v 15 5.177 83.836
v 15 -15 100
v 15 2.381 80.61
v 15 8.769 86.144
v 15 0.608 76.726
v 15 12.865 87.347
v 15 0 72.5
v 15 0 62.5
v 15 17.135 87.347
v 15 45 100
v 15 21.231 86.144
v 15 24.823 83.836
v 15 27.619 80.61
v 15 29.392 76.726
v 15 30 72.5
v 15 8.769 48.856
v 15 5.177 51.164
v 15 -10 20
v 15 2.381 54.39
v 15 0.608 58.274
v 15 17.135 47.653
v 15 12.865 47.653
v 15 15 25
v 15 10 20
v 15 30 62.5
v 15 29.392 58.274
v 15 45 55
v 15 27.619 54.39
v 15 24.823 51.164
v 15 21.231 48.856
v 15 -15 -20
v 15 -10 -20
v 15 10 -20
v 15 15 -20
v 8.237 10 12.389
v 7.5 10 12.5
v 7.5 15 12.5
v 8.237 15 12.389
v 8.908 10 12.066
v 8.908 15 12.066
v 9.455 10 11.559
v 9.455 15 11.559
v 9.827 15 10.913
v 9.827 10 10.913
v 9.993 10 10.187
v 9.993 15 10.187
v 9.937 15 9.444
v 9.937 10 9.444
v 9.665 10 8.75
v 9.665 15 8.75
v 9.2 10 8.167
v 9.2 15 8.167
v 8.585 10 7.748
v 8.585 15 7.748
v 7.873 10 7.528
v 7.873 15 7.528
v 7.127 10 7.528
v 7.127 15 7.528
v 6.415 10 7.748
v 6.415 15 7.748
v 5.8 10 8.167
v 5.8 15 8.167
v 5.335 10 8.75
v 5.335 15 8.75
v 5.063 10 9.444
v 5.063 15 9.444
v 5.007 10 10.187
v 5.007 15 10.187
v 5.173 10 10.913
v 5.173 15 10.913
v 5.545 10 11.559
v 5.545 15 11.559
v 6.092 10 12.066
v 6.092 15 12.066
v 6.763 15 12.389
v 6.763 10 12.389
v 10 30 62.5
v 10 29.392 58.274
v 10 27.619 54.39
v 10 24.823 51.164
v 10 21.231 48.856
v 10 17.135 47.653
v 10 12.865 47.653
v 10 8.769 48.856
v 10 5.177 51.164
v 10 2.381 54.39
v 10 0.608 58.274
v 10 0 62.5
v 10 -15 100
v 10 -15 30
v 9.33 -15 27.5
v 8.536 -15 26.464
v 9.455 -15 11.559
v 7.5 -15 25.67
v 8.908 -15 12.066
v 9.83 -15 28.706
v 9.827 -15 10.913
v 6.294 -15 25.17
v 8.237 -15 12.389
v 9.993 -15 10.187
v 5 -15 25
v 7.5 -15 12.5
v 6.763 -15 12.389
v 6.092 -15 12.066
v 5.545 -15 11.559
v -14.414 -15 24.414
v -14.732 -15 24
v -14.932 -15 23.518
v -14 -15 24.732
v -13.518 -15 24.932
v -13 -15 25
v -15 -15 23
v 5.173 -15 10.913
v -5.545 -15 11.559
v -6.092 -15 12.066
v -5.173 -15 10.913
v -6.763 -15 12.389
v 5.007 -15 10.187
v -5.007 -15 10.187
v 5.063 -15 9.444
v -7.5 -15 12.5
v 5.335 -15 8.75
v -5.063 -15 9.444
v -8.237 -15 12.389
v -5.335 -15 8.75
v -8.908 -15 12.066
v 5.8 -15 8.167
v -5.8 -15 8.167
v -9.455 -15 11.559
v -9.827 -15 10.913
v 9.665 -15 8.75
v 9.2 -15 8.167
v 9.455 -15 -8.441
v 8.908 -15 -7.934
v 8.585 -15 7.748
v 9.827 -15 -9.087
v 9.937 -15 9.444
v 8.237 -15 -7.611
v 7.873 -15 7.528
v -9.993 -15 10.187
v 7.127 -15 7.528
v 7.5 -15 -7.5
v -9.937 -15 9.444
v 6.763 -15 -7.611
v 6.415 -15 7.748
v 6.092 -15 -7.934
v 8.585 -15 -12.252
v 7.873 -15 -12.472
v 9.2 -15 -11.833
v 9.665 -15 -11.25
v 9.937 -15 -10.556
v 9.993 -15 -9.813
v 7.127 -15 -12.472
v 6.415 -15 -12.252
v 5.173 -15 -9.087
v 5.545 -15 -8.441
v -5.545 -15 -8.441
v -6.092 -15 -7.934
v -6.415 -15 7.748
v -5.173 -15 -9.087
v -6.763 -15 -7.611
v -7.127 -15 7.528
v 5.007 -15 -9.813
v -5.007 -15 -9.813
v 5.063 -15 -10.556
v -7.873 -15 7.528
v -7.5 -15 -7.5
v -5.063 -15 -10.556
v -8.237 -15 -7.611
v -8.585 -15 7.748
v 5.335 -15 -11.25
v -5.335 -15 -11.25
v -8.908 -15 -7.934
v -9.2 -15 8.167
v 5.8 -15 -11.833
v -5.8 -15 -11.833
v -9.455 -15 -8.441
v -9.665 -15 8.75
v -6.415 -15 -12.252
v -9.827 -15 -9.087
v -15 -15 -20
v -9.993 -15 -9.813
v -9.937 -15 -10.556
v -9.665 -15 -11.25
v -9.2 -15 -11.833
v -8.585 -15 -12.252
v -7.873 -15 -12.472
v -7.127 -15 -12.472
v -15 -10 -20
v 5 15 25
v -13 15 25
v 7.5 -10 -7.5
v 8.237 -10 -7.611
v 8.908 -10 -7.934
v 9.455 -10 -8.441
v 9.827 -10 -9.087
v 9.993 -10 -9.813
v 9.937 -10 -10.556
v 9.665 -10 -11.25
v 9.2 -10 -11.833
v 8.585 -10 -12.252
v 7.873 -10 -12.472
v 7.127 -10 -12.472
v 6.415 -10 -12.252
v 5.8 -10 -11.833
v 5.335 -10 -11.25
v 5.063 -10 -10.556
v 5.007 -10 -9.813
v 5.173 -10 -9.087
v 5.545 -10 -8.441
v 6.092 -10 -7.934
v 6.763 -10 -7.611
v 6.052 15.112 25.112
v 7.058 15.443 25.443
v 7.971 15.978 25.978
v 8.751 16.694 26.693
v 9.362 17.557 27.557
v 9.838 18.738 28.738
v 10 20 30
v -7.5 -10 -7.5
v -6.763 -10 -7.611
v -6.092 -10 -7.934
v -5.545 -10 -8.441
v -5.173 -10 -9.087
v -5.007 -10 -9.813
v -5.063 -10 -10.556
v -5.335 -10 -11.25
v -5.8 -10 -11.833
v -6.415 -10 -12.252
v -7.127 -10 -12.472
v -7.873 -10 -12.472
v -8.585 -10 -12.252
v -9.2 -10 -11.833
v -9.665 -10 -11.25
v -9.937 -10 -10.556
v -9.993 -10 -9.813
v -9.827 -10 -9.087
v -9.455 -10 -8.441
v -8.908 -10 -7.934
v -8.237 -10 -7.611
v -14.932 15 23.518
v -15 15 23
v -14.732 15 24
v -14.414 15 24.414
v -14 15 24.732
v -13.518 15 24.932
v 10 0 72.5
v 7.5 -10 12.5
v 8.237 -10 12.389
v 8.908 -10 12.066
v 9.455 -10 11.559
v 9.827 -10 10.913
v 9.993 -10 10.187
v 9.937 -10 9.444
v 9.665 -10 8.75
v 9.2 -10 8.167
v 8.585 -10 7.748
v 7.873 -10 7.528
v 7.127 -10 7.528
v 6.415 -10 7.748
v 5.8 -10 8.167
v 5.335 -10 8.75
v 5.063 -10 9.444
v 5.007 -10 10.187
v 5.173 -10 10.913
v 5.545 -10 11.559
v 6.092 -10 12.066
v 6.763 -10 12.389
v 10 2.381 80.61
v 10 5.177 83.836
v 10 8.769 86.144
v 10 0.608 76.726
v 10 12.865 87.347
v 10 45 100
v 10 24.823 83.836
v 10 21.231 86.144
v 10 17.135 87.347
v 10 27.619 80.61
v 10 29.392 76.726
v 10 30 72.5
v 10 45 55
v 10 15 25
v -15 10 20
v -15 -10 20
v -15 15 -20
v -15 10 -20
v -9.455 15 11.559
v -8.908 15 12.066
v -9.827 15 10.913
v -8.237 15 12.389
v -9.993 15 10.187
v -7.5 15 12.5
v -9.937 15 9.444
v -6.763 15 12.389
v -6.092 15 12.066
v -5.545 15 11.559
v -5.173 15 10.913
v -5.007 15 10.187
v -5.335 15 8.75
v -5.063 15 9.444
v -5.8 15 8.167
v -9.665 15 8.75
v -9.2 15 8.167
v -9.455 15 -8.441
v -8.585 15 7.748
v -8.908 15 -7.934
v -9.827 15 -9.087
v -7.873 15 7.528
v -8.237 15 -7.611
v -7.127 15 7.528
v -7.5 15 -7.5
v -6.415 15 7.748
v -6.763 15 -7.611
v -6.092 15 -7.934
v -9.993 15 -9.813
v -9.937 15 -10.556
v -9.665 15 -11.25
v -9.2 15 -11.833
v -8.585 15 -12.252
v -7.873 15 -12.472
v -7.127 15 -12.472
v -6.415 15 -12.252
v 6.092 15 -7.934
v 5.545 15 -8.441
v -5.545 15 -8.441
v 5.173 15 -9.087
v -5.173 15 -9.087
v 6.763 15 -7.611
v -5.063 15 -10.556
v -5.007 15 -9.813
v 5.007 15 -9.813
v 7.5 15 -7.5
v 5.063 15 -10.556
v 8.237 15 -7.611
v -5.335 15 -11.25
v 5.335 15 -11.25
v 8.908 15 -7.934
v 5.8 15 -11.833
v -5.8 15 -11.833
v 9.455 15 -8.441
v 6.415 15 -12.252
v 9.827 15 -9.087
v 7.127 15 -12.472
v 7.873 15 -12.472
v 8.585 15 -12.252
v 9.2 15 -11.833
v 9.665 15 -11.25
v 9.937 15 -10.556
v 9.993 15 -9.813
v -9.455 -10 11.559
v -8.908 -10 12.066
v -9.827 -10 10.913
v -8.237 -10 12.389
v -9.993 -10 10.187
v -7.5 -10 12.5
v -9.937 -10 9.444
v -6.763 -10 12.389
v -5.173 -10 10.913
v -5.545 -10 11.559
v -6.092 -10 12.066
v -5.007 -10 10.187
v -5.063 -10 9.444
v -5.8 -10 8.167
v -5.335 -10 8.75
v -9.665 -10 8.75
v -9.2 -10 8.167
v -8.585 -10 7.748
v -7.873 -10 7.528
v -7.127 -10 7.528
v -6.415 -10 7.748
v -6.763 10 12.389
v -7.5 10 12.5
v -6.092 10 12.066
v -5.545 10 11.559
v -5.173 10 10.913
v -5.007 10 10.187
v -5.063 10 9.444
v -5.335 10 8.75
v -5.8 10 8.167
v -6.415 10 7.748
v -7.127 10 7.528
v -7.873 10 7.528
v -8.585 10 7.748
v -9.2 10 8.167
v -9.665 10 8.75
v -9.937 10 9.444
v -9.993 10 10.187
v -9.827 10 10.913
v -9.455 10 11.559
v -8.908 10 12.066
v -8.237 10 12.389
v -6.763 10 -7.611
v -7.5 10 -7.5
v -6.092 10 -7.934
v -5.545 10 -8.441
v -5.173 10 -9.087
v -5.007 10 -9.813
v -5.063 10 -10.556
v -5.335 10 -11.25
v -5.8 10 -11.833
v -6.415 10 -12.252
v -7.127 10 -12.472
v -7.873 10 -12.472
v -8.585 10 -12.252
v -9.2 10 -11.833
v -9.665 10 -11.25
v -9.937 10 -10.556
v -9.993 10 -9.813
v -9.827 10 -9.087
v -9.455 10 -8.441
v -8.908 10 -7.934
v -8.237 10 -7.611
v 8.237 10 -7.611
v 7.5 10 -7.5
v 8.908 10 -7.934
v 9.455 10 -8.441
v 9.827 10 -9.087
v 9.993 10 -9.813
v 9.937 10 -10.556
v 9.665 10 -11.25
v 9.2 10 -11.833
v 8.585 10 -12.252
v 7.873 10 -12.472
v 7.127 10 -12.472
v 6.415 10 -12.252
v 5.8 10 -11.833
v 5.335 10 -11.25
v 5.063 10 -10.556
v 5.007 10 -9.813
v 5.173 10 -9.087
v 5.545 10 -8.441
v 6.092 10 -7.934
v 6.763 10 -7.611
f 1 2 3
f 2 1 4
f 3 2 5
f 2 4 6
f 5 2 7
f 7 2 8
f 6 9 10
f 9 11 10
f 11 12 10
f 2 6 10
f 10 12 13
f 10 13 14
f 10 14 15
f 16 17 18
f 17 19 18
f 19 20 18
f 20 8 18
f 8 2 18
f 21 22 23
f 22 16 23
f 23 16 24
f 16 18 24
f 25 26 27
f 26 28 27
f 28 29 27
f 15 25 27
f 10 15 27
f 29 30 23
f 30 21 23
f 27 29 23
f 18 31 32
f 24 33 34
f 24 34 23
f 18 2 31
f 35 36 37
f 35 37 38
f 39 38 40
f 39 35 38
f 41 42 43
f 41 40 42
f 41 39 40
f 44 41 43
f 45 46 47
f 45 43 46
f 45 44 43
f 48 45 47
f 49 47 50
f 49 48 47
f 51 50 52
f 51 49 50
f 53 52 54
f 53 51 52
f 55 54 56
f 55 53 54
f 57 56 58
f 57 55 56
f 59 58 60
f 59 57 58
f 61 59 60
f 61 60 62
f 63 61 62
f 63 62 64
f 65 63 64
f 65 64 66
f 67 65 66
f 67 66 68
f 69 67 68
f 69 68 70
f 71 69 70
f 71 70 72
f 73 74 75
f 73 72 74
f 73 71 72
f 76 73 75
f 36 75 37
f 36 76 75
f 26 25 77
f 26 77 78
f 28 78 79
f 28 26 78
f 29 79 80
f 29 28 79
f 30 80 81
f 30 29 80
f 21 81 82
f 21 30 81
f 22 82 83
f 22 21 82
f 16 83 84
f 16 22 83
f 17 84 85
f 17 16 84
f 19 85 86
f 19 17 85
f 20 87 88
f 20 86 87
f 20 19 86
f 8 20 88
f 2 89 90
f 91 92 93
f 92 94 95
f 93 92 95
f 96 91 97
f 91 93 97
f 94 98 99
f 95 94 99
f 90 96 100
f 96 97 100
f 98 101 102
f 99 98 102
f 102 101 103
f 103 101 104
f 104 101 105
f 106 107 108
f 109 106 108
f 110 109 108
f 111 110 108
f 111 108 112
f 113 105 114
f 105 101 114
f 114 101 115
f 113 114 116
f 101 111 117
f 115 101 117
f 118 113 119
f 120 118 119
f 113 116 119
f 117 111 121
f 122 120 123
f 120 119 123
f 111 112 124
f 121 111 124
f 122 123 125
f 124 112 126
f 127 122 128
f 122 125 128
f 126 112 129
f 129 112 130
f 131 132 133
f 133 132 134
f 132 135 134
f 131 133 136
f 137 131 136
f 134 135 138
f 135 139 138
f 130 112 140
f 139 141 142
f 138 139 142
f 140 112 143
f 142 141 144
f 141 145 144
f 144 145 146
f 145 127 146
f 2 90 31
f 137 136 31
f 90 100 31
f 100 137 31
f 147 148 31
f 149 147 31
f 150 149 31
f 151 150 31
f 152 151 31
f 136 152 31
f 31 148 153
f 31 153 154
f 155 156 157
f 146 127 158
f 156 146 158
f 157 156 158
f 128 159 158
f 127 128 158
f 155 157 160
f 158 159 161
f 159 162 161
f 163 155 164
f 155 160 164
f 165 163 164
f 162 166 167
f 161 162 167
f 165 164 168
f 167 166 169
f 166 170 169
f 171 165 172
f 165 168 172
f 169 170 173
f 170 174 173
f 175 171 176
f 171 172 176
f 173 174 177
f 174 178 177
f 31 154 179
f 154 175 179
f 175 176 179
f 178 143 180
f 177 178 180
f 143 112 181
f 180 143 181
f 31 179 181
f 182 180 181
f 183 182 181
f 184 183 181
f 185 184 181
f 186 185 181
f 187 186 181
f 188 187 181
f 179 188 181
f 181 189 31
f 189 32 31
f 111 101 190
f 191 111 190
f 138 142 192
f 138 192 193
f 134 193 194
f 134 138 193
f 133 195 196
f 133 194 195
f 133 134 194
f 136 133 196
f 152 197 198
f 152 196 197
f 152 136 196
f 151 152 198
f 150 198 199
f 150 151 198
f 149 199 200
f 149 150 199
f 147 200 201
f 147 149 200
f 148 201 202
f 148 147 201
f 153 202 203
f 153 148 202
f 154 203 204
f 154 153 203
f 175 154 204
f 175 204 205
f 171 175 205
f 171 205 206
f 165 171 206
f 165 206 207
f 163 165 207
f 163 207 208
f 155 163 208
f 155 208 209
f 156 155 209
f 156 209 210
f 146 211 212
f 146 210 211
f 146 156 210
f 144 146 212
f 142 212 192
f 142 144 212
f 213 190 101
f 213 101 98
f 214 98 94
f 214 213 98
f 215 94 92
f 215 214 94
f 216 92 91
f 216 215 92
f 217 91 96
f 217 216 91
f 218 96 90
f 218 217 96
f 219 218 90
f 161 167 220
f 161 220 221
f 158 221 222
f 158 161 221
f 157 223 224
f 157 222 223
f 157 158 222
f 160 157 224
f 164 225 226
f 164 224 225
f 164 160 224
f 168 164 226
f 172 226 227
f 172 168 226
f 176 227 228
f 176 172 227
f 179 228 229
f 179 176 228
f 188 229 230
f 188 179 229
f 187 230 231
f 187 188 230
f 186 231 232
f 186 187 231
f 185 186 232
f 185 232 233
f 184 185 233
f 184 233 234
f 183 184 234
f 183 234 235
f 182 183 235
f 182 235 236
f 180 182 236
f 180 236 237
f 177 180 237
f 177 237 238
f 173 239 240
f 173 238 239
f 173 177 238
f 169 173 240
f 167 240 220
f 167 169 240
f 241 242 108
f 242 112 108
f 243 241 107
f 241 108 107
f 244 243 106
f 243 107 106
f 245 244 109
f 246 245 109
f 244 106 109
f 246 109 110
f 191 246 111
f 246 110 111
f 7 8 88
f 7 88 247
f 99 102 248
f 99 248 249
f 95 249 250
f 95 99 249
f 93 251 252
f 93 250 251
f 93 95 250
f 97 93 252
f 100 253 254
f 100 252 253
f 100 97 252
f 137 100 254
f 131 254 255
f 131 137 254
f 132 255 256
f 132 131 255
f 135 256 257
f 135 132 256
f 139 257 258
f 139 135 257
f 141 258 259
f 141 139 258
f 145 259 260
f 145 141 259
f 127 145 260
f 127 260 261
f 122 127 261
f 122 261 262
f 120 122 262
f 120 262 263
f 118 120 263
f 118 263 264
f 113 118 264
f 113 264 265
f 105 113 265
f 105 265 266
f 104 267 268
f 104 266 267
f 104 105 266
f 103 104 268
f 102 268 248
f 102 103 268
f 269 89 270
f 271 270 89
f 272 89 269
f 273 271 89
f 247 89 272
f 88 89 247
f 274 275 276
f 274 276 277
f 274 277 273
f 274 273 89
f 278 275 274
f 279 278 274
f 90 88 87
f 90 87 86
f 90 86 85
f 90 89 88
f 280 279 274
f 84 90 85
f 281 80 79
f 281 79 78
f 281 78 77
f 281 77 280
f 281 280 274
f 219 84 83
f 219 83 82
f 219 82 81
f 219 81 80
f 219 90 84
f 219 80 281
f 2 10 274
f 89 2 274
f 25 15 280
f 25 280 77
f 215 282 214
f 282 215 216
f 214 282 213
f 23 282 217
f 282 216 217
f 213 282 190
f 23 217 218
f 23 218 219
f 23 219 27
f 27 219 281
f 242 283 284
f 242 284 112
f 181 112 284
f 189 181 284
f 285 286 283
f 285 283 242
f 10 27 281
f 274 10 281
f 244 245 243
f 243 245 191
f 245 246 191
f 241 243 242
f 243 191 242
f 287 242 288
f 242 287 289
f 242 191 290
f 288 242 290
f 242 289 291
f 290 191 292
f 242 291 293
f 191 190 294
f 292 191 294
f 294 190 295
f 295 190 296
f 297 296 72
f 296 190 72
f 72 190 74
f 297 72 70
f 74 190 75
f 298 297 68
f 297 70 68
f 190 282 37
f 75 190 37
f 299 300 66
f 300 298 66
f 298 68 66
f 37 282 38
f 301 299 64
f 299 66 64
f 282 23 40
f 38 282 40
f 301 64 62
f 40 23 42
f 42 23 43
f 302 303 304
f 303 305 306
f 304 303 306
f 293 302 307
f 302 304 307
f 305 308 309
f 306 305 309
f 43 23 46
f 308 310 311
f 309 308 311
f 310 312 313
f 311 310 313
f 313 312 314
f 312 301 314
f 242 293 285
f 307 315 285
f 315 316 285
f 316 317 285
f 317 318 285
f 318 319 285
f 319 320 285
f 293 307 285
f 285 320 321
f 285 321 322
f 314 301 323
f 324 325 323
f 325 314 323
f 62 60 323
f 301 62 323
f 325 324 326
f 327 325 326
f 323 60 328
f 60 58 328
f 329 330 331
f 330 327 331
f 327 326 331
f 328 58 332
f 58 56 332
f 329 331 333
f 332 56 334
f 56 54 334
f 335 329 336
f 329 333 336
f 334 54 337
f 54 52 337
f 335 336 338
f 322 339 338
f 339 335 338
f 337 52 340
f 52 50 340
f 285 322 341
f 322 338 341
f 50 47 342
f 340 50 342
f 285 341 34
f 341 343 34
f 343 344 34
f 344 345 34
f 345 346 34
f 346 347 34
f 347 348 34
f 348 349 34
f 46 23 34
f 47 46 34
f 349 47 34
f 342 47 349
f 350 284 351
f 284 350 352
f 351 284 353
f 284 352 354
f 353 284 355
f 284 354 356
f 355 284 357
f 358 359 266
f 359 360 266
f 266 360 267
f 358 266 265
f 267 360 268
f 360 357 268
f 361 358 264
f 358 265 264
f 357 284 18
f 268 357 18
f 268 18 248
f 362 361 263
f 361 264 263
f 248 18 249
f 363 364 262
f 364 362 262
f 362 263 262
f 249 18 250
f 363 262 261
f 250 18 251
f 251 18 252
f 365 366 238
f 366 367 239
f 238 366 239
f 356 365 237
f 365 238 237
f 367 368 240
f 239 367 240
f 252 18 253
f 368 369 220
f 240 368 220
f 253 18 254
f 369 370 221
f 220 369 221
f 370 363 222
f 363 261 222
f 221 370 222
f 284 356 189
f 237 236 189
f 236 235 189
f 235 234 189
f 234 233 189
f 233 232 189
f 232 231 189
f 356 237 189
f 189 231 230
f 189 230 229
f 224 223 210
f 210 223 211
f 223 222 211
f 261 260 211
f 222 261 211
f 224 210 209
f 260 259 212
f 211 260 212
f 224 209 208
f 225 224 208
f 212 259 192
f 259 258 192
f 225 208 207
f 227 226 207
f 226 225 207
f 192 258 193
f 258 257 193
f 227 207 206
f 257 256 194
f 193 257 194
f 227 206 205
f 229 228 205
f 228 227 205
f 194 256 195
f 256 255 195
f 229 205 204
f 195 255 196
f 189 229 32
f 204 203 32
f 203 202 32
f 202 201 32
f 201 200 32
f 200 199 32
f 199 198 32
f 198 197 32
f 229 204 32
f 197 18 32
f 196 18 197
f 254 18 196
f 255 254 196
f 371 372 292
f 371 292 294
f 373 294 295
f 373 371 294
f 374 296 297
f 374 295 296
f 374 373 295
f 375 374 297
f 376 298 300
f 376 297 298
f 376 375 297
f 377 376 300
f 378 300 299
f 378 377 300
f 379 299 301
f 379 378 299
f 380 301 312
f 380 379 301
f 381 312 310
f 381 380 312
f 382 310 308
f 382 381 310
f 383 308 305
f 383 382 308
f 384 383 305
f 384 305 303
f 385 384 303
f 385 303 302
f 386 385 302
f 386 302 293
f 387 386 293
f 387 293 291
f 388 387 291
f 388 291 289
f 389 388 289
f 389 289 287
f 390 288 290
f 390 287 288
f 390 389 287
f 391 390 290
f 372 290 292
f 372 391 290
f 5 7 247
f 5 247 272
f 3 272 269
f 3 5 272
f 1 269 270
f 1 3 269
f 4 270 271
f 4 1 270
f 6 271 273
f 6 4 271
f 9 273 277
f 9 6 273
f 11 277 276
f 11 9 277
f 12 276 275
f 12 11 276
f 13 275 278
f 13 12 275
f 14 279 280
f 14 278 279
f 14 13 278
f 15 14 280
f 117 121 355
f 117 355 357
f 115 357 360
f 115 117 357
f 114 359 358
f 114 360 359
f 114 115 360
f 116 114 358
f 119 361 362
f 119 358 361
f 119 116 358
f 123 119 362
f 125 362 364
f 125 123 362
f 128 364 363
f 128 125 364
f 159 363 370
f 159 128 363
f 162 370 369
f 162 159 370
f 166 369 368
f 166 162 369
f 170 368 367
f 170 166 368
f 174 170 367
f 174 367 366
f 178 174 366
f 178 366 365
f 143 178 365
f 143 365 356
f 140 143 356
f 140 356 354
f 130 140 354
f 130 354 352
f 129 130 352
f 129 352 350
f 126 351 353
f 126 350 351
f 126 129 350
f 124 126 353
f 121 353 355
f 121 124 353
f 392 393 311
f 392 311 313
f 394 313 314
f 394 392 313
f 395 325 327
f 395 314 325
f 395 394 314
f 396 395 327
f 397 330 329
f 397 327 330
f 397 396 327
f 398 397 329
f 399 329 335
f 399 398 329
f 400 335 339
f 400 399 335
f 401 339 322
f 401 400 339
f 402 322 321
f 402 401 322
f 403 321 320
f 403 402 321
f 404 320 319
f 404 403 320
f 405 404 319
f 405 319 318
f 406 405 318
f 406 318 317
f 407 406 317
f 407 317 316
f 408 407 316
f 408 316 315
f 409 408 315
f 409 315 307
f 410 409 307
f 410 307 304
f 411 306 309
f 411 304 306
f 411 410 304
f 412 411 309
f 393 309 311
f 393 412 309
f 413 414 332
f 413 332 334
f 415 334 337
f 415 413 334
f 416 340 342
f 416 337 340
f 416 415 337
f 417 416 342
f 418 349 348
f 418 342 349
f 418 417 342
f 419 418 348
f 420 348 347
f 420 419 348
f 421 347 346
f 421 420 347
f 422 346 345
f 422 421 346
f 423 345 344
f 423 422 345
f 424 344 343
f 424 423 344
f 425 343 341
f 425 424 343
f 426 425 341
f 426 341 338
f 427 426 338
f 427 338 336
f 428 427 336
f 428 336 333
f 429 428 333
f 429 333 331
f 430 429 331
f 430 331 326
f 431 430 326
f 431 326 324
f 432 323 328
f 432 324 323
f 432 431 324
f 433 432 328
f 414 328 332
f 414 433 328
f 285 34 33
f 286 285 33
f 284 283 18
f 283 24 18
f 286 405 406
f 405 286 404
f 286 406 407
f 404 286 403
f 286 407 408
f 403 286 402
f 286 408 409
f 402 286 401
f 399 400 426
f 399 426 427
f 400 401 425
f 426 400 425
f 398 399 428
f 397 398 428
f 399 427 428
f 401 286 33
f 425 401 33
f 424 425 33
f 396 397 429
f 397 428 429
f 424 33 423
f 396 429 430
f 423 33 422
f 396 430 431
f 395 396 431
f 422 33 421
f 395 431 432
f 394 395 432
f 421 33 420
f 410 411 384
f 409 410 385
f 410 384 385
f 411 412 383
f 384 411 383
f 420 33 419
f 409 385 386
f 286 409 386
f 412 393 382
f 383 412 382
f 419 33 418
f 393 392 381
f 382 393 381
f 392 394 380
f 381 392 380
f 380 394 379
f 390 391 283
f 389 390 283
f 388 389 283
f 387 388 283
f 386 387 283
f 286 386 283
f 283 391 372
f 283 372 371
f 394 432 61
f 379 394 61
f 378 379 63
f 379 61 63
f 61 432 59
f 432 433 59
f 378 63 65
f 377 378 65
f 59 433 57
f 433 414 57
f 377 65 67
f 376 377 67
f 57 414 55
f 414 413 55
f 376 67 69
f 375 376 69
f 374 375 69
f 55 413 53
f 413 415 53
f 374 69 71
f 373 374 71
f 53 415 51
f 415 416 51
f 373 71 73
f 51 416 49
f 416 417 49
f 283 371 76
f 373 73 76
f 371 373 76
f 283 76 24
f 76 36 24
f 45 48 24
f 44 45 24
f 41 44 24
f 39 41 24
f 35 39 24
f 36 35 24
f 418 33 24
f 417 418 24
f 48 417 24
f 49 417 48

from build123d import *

# Parameters (mm, degrees)
BOSS_EXTRUDE1_DEPTH      = 15
SKETCH2_W                = 5
SKETCH2_H                = 60
BOSS_EXTRUDE2_DEPTH      = 75
CHAMFER1_SIZE            = 30
CHAMFER1_OF_MIRROR1_SIZE = 30
CUT_EXTRUDE3_DEPTH       = 113.472218792
CUT_EXTRUDE4_DEPTH       = 114.688170009
FILLET3_R                = 5
FILLET4_R                = 2
CUT_EXTRUDE6_DEPTH       = 106.475115549
CUT_EXTRUDE6_DEPTH_BACK  = 106.475115549
SKETCH8_R                = 2.5


# Some blends are built 0.0001 mm under size
with BuildPart() as part:
    # Sketch1 → Boss-Extrude1 (new, symmetric)
    with BuildSketch(Plane(origin=(0, 0, 0), x_dir=(0, 0, -1), z_dir=(1, 0, 0))):
        Polygon((20, 10), (-20, 10), (-20, -10), (20, -10), (20, -15), (-25, -15), (-25, 15), (20, 15), align=None)
    extrude(amount=BOSS_EXTRUDE1_DEPTH, both=True)

    # Sketch2 → Boss-Extrude2 (add)
    with BuildSketch(Plane.XY.offset(25)):
        with Locations((-12.5, 15)):
            Rectangle(SKETCH2_W, SKETCH2_H)
    boss_extrude2 = extrude(amount=BOSS_EXTRUDE2_DEPTH)

    # Chamfer1
    chamfer1_edges = [part.edges().sort_by_distance(p)[0] for p in [
        (-12.5, 45, 25),
    ]]
    chamfer(chamfer1_edges, length=CHAMFER1_SIZE - 0.0001)  # a hair under: the kernel refuses the full size

    # Mirror1: Boss-Extrude2 across plane
    add(boss_extrude2.mirror(Plane(origin=(0, 0, 0), x_dir=(0, 0, 1), z_dir=(1, 0, 0))))

    # Chamfer1 of Mirror1
    chamfer1_of_mirror1_edges = [part.edges().sort_by_distance(p)[0] for p in [
        (12.5, 45, 25),
    ]]
    chamfer(chamfer1_of_mirror1_edges, length=CHAMFER1_OF_MIRROR1_SIZE - 0.0001)  # a hair under: the kernel refuses the full size

    # Sketch5 → Cut-Extrude3 (cut, through all)
    with BuildSketch(Plane(origin=(-10, 0, 0), x_dir=(0, 0, -1), z_dir=(1, 0, 0))):
        Polygon((-25, -15), (-25, 15), (-55, 45), (-100, 45), (-100, -15), align=None)
    extrude(amount=-CUT_EXTRUDE3_DEPTH, mode=Mode.SUBTRACT)

    # Sketch6 → Cut-Extrude4 (cut, through all)
    with BuildSketch(Plane(origin=(15, 0, 0), x_dir=(0, 0, -1), z_dir=(1, 0, 0))):
        with BuildLine():
            Line((-62.5, 0), (-72.5, 0))
            ThreePointArc((-72.5, 0), (-87.5, 15), (-72.5, 30))
            Line((-72.5, 30), (-62.5, 30))
            ThreePointArc((-62.5, 30), (-47.5, 15), (-62.5, 0))
        make_face()
    extrude(amount=-CUT_EXTRUDE4_DEPTH, mode=Mode.SUBTRACT)

    # Fillet3
    # the kernel refuses this fillet: 5 mm, written as the material it adds along each edge
    with BuildSketch(Plane(origin=(10, 27.5, 25), x_dir=(0, 0, 1), z_dir=(0, -1, 0))) as fillet3_piece_1_section:
        with BuildLine():
            CenterArc((FILLET3_R, FILLET3_R), FILLET3_R, 180, 90)
            Line((0, FILLET3_R), (0, 0))
            Line((0, 0), (FILLET3_R, 0))
        make_face()
    fillet3_piece_1 = extrude(amount=42.5, mode=Mode.PRIVATE)
    fillet3_piece_1 = split(fillet3_piece_1, bisect_by=Plane(origin=(9.467598147, 16.61296207, 26.61286207), z_dir=(0, -0.7071067811865476, 0.7071067811865476)), keep=Keep.TOP, mode=Mode.PRIVATE)
    fillet3_piece_1 = split(fillet3_piece_1, bisect_by=Plane(origin=(9.467598147, 15, 27.150516093), z_dir=(0, 1, 0)), keep=Keep.TOP, mode=Mode.PRIVATE)
    add(fillet3_piece_1)
    with BuildSketch(Plane(origin=(10, 15, 25), x_dir=(0, 0, 1), z_dir=(0, -1, 0))) as fillet3_piece_2_section:
        with BuildLine():
            CenterArc((FILLET3_R, FILLET3_R), FILLET3_R, 180, 90)
            Line((0, FILLET3_R), (0, 0))
            Line((0, 0), (FILLET3_R, 0))
        make_face()
    fillet3_piece_2 = extrude(amount=30, mode=Mode.PRIVATE)
    fillet3_piece_2 = split(fillet3_piece_2, bisect_by=Plane(origin=(8.982634351, 0, 25), z_dir=(0, 0, 1)), keep=Keep.TOP, mode=Mode.PRIVATE)
    add(fillet3_piece_2)

    # Fillet4
    fillet4_edges = [part.edges().sort_by_distance(p)[0] for p in [
        (-15, 0, 25),
    ]]
    fillet(fillet4_edges, radius=FILLET4_R)

    # Sketch8 → Cut-Extrude6 (cut, two sides: drawn at the far end of the back side and taken through both)
    with BuildSketch(Plane(origin=(0, 15, 0), x_dir=(1, 0, 0), z_dir=(0, 1, 0)).offset(-CUT_EXTRUDE6_DEPTH_BACK)):
        with Locations(Location((-7.5, -10, 0), (0, 0, 270))):
            Circle(SKETCH8_R)
        with Locations(Location((7.5, -10, 0), (0, 0, 270))):
            Circle(SKETCH8_R)
        with Locations(Location((-7.5, 10, 0), (0, 0, 270))):
            Circle(SKETCH8_R)
        with Locations(Location((7.5, 10, 0), (0, 0, 270))):
            Circle(SKETCH8_R)
    extrude(amount=CUT_EXTRUDE6_DEPTH + CUT_EXTRUDE6_DEPTH_BACK, mode=Mode.SUBTRACT)


solid = part.part
